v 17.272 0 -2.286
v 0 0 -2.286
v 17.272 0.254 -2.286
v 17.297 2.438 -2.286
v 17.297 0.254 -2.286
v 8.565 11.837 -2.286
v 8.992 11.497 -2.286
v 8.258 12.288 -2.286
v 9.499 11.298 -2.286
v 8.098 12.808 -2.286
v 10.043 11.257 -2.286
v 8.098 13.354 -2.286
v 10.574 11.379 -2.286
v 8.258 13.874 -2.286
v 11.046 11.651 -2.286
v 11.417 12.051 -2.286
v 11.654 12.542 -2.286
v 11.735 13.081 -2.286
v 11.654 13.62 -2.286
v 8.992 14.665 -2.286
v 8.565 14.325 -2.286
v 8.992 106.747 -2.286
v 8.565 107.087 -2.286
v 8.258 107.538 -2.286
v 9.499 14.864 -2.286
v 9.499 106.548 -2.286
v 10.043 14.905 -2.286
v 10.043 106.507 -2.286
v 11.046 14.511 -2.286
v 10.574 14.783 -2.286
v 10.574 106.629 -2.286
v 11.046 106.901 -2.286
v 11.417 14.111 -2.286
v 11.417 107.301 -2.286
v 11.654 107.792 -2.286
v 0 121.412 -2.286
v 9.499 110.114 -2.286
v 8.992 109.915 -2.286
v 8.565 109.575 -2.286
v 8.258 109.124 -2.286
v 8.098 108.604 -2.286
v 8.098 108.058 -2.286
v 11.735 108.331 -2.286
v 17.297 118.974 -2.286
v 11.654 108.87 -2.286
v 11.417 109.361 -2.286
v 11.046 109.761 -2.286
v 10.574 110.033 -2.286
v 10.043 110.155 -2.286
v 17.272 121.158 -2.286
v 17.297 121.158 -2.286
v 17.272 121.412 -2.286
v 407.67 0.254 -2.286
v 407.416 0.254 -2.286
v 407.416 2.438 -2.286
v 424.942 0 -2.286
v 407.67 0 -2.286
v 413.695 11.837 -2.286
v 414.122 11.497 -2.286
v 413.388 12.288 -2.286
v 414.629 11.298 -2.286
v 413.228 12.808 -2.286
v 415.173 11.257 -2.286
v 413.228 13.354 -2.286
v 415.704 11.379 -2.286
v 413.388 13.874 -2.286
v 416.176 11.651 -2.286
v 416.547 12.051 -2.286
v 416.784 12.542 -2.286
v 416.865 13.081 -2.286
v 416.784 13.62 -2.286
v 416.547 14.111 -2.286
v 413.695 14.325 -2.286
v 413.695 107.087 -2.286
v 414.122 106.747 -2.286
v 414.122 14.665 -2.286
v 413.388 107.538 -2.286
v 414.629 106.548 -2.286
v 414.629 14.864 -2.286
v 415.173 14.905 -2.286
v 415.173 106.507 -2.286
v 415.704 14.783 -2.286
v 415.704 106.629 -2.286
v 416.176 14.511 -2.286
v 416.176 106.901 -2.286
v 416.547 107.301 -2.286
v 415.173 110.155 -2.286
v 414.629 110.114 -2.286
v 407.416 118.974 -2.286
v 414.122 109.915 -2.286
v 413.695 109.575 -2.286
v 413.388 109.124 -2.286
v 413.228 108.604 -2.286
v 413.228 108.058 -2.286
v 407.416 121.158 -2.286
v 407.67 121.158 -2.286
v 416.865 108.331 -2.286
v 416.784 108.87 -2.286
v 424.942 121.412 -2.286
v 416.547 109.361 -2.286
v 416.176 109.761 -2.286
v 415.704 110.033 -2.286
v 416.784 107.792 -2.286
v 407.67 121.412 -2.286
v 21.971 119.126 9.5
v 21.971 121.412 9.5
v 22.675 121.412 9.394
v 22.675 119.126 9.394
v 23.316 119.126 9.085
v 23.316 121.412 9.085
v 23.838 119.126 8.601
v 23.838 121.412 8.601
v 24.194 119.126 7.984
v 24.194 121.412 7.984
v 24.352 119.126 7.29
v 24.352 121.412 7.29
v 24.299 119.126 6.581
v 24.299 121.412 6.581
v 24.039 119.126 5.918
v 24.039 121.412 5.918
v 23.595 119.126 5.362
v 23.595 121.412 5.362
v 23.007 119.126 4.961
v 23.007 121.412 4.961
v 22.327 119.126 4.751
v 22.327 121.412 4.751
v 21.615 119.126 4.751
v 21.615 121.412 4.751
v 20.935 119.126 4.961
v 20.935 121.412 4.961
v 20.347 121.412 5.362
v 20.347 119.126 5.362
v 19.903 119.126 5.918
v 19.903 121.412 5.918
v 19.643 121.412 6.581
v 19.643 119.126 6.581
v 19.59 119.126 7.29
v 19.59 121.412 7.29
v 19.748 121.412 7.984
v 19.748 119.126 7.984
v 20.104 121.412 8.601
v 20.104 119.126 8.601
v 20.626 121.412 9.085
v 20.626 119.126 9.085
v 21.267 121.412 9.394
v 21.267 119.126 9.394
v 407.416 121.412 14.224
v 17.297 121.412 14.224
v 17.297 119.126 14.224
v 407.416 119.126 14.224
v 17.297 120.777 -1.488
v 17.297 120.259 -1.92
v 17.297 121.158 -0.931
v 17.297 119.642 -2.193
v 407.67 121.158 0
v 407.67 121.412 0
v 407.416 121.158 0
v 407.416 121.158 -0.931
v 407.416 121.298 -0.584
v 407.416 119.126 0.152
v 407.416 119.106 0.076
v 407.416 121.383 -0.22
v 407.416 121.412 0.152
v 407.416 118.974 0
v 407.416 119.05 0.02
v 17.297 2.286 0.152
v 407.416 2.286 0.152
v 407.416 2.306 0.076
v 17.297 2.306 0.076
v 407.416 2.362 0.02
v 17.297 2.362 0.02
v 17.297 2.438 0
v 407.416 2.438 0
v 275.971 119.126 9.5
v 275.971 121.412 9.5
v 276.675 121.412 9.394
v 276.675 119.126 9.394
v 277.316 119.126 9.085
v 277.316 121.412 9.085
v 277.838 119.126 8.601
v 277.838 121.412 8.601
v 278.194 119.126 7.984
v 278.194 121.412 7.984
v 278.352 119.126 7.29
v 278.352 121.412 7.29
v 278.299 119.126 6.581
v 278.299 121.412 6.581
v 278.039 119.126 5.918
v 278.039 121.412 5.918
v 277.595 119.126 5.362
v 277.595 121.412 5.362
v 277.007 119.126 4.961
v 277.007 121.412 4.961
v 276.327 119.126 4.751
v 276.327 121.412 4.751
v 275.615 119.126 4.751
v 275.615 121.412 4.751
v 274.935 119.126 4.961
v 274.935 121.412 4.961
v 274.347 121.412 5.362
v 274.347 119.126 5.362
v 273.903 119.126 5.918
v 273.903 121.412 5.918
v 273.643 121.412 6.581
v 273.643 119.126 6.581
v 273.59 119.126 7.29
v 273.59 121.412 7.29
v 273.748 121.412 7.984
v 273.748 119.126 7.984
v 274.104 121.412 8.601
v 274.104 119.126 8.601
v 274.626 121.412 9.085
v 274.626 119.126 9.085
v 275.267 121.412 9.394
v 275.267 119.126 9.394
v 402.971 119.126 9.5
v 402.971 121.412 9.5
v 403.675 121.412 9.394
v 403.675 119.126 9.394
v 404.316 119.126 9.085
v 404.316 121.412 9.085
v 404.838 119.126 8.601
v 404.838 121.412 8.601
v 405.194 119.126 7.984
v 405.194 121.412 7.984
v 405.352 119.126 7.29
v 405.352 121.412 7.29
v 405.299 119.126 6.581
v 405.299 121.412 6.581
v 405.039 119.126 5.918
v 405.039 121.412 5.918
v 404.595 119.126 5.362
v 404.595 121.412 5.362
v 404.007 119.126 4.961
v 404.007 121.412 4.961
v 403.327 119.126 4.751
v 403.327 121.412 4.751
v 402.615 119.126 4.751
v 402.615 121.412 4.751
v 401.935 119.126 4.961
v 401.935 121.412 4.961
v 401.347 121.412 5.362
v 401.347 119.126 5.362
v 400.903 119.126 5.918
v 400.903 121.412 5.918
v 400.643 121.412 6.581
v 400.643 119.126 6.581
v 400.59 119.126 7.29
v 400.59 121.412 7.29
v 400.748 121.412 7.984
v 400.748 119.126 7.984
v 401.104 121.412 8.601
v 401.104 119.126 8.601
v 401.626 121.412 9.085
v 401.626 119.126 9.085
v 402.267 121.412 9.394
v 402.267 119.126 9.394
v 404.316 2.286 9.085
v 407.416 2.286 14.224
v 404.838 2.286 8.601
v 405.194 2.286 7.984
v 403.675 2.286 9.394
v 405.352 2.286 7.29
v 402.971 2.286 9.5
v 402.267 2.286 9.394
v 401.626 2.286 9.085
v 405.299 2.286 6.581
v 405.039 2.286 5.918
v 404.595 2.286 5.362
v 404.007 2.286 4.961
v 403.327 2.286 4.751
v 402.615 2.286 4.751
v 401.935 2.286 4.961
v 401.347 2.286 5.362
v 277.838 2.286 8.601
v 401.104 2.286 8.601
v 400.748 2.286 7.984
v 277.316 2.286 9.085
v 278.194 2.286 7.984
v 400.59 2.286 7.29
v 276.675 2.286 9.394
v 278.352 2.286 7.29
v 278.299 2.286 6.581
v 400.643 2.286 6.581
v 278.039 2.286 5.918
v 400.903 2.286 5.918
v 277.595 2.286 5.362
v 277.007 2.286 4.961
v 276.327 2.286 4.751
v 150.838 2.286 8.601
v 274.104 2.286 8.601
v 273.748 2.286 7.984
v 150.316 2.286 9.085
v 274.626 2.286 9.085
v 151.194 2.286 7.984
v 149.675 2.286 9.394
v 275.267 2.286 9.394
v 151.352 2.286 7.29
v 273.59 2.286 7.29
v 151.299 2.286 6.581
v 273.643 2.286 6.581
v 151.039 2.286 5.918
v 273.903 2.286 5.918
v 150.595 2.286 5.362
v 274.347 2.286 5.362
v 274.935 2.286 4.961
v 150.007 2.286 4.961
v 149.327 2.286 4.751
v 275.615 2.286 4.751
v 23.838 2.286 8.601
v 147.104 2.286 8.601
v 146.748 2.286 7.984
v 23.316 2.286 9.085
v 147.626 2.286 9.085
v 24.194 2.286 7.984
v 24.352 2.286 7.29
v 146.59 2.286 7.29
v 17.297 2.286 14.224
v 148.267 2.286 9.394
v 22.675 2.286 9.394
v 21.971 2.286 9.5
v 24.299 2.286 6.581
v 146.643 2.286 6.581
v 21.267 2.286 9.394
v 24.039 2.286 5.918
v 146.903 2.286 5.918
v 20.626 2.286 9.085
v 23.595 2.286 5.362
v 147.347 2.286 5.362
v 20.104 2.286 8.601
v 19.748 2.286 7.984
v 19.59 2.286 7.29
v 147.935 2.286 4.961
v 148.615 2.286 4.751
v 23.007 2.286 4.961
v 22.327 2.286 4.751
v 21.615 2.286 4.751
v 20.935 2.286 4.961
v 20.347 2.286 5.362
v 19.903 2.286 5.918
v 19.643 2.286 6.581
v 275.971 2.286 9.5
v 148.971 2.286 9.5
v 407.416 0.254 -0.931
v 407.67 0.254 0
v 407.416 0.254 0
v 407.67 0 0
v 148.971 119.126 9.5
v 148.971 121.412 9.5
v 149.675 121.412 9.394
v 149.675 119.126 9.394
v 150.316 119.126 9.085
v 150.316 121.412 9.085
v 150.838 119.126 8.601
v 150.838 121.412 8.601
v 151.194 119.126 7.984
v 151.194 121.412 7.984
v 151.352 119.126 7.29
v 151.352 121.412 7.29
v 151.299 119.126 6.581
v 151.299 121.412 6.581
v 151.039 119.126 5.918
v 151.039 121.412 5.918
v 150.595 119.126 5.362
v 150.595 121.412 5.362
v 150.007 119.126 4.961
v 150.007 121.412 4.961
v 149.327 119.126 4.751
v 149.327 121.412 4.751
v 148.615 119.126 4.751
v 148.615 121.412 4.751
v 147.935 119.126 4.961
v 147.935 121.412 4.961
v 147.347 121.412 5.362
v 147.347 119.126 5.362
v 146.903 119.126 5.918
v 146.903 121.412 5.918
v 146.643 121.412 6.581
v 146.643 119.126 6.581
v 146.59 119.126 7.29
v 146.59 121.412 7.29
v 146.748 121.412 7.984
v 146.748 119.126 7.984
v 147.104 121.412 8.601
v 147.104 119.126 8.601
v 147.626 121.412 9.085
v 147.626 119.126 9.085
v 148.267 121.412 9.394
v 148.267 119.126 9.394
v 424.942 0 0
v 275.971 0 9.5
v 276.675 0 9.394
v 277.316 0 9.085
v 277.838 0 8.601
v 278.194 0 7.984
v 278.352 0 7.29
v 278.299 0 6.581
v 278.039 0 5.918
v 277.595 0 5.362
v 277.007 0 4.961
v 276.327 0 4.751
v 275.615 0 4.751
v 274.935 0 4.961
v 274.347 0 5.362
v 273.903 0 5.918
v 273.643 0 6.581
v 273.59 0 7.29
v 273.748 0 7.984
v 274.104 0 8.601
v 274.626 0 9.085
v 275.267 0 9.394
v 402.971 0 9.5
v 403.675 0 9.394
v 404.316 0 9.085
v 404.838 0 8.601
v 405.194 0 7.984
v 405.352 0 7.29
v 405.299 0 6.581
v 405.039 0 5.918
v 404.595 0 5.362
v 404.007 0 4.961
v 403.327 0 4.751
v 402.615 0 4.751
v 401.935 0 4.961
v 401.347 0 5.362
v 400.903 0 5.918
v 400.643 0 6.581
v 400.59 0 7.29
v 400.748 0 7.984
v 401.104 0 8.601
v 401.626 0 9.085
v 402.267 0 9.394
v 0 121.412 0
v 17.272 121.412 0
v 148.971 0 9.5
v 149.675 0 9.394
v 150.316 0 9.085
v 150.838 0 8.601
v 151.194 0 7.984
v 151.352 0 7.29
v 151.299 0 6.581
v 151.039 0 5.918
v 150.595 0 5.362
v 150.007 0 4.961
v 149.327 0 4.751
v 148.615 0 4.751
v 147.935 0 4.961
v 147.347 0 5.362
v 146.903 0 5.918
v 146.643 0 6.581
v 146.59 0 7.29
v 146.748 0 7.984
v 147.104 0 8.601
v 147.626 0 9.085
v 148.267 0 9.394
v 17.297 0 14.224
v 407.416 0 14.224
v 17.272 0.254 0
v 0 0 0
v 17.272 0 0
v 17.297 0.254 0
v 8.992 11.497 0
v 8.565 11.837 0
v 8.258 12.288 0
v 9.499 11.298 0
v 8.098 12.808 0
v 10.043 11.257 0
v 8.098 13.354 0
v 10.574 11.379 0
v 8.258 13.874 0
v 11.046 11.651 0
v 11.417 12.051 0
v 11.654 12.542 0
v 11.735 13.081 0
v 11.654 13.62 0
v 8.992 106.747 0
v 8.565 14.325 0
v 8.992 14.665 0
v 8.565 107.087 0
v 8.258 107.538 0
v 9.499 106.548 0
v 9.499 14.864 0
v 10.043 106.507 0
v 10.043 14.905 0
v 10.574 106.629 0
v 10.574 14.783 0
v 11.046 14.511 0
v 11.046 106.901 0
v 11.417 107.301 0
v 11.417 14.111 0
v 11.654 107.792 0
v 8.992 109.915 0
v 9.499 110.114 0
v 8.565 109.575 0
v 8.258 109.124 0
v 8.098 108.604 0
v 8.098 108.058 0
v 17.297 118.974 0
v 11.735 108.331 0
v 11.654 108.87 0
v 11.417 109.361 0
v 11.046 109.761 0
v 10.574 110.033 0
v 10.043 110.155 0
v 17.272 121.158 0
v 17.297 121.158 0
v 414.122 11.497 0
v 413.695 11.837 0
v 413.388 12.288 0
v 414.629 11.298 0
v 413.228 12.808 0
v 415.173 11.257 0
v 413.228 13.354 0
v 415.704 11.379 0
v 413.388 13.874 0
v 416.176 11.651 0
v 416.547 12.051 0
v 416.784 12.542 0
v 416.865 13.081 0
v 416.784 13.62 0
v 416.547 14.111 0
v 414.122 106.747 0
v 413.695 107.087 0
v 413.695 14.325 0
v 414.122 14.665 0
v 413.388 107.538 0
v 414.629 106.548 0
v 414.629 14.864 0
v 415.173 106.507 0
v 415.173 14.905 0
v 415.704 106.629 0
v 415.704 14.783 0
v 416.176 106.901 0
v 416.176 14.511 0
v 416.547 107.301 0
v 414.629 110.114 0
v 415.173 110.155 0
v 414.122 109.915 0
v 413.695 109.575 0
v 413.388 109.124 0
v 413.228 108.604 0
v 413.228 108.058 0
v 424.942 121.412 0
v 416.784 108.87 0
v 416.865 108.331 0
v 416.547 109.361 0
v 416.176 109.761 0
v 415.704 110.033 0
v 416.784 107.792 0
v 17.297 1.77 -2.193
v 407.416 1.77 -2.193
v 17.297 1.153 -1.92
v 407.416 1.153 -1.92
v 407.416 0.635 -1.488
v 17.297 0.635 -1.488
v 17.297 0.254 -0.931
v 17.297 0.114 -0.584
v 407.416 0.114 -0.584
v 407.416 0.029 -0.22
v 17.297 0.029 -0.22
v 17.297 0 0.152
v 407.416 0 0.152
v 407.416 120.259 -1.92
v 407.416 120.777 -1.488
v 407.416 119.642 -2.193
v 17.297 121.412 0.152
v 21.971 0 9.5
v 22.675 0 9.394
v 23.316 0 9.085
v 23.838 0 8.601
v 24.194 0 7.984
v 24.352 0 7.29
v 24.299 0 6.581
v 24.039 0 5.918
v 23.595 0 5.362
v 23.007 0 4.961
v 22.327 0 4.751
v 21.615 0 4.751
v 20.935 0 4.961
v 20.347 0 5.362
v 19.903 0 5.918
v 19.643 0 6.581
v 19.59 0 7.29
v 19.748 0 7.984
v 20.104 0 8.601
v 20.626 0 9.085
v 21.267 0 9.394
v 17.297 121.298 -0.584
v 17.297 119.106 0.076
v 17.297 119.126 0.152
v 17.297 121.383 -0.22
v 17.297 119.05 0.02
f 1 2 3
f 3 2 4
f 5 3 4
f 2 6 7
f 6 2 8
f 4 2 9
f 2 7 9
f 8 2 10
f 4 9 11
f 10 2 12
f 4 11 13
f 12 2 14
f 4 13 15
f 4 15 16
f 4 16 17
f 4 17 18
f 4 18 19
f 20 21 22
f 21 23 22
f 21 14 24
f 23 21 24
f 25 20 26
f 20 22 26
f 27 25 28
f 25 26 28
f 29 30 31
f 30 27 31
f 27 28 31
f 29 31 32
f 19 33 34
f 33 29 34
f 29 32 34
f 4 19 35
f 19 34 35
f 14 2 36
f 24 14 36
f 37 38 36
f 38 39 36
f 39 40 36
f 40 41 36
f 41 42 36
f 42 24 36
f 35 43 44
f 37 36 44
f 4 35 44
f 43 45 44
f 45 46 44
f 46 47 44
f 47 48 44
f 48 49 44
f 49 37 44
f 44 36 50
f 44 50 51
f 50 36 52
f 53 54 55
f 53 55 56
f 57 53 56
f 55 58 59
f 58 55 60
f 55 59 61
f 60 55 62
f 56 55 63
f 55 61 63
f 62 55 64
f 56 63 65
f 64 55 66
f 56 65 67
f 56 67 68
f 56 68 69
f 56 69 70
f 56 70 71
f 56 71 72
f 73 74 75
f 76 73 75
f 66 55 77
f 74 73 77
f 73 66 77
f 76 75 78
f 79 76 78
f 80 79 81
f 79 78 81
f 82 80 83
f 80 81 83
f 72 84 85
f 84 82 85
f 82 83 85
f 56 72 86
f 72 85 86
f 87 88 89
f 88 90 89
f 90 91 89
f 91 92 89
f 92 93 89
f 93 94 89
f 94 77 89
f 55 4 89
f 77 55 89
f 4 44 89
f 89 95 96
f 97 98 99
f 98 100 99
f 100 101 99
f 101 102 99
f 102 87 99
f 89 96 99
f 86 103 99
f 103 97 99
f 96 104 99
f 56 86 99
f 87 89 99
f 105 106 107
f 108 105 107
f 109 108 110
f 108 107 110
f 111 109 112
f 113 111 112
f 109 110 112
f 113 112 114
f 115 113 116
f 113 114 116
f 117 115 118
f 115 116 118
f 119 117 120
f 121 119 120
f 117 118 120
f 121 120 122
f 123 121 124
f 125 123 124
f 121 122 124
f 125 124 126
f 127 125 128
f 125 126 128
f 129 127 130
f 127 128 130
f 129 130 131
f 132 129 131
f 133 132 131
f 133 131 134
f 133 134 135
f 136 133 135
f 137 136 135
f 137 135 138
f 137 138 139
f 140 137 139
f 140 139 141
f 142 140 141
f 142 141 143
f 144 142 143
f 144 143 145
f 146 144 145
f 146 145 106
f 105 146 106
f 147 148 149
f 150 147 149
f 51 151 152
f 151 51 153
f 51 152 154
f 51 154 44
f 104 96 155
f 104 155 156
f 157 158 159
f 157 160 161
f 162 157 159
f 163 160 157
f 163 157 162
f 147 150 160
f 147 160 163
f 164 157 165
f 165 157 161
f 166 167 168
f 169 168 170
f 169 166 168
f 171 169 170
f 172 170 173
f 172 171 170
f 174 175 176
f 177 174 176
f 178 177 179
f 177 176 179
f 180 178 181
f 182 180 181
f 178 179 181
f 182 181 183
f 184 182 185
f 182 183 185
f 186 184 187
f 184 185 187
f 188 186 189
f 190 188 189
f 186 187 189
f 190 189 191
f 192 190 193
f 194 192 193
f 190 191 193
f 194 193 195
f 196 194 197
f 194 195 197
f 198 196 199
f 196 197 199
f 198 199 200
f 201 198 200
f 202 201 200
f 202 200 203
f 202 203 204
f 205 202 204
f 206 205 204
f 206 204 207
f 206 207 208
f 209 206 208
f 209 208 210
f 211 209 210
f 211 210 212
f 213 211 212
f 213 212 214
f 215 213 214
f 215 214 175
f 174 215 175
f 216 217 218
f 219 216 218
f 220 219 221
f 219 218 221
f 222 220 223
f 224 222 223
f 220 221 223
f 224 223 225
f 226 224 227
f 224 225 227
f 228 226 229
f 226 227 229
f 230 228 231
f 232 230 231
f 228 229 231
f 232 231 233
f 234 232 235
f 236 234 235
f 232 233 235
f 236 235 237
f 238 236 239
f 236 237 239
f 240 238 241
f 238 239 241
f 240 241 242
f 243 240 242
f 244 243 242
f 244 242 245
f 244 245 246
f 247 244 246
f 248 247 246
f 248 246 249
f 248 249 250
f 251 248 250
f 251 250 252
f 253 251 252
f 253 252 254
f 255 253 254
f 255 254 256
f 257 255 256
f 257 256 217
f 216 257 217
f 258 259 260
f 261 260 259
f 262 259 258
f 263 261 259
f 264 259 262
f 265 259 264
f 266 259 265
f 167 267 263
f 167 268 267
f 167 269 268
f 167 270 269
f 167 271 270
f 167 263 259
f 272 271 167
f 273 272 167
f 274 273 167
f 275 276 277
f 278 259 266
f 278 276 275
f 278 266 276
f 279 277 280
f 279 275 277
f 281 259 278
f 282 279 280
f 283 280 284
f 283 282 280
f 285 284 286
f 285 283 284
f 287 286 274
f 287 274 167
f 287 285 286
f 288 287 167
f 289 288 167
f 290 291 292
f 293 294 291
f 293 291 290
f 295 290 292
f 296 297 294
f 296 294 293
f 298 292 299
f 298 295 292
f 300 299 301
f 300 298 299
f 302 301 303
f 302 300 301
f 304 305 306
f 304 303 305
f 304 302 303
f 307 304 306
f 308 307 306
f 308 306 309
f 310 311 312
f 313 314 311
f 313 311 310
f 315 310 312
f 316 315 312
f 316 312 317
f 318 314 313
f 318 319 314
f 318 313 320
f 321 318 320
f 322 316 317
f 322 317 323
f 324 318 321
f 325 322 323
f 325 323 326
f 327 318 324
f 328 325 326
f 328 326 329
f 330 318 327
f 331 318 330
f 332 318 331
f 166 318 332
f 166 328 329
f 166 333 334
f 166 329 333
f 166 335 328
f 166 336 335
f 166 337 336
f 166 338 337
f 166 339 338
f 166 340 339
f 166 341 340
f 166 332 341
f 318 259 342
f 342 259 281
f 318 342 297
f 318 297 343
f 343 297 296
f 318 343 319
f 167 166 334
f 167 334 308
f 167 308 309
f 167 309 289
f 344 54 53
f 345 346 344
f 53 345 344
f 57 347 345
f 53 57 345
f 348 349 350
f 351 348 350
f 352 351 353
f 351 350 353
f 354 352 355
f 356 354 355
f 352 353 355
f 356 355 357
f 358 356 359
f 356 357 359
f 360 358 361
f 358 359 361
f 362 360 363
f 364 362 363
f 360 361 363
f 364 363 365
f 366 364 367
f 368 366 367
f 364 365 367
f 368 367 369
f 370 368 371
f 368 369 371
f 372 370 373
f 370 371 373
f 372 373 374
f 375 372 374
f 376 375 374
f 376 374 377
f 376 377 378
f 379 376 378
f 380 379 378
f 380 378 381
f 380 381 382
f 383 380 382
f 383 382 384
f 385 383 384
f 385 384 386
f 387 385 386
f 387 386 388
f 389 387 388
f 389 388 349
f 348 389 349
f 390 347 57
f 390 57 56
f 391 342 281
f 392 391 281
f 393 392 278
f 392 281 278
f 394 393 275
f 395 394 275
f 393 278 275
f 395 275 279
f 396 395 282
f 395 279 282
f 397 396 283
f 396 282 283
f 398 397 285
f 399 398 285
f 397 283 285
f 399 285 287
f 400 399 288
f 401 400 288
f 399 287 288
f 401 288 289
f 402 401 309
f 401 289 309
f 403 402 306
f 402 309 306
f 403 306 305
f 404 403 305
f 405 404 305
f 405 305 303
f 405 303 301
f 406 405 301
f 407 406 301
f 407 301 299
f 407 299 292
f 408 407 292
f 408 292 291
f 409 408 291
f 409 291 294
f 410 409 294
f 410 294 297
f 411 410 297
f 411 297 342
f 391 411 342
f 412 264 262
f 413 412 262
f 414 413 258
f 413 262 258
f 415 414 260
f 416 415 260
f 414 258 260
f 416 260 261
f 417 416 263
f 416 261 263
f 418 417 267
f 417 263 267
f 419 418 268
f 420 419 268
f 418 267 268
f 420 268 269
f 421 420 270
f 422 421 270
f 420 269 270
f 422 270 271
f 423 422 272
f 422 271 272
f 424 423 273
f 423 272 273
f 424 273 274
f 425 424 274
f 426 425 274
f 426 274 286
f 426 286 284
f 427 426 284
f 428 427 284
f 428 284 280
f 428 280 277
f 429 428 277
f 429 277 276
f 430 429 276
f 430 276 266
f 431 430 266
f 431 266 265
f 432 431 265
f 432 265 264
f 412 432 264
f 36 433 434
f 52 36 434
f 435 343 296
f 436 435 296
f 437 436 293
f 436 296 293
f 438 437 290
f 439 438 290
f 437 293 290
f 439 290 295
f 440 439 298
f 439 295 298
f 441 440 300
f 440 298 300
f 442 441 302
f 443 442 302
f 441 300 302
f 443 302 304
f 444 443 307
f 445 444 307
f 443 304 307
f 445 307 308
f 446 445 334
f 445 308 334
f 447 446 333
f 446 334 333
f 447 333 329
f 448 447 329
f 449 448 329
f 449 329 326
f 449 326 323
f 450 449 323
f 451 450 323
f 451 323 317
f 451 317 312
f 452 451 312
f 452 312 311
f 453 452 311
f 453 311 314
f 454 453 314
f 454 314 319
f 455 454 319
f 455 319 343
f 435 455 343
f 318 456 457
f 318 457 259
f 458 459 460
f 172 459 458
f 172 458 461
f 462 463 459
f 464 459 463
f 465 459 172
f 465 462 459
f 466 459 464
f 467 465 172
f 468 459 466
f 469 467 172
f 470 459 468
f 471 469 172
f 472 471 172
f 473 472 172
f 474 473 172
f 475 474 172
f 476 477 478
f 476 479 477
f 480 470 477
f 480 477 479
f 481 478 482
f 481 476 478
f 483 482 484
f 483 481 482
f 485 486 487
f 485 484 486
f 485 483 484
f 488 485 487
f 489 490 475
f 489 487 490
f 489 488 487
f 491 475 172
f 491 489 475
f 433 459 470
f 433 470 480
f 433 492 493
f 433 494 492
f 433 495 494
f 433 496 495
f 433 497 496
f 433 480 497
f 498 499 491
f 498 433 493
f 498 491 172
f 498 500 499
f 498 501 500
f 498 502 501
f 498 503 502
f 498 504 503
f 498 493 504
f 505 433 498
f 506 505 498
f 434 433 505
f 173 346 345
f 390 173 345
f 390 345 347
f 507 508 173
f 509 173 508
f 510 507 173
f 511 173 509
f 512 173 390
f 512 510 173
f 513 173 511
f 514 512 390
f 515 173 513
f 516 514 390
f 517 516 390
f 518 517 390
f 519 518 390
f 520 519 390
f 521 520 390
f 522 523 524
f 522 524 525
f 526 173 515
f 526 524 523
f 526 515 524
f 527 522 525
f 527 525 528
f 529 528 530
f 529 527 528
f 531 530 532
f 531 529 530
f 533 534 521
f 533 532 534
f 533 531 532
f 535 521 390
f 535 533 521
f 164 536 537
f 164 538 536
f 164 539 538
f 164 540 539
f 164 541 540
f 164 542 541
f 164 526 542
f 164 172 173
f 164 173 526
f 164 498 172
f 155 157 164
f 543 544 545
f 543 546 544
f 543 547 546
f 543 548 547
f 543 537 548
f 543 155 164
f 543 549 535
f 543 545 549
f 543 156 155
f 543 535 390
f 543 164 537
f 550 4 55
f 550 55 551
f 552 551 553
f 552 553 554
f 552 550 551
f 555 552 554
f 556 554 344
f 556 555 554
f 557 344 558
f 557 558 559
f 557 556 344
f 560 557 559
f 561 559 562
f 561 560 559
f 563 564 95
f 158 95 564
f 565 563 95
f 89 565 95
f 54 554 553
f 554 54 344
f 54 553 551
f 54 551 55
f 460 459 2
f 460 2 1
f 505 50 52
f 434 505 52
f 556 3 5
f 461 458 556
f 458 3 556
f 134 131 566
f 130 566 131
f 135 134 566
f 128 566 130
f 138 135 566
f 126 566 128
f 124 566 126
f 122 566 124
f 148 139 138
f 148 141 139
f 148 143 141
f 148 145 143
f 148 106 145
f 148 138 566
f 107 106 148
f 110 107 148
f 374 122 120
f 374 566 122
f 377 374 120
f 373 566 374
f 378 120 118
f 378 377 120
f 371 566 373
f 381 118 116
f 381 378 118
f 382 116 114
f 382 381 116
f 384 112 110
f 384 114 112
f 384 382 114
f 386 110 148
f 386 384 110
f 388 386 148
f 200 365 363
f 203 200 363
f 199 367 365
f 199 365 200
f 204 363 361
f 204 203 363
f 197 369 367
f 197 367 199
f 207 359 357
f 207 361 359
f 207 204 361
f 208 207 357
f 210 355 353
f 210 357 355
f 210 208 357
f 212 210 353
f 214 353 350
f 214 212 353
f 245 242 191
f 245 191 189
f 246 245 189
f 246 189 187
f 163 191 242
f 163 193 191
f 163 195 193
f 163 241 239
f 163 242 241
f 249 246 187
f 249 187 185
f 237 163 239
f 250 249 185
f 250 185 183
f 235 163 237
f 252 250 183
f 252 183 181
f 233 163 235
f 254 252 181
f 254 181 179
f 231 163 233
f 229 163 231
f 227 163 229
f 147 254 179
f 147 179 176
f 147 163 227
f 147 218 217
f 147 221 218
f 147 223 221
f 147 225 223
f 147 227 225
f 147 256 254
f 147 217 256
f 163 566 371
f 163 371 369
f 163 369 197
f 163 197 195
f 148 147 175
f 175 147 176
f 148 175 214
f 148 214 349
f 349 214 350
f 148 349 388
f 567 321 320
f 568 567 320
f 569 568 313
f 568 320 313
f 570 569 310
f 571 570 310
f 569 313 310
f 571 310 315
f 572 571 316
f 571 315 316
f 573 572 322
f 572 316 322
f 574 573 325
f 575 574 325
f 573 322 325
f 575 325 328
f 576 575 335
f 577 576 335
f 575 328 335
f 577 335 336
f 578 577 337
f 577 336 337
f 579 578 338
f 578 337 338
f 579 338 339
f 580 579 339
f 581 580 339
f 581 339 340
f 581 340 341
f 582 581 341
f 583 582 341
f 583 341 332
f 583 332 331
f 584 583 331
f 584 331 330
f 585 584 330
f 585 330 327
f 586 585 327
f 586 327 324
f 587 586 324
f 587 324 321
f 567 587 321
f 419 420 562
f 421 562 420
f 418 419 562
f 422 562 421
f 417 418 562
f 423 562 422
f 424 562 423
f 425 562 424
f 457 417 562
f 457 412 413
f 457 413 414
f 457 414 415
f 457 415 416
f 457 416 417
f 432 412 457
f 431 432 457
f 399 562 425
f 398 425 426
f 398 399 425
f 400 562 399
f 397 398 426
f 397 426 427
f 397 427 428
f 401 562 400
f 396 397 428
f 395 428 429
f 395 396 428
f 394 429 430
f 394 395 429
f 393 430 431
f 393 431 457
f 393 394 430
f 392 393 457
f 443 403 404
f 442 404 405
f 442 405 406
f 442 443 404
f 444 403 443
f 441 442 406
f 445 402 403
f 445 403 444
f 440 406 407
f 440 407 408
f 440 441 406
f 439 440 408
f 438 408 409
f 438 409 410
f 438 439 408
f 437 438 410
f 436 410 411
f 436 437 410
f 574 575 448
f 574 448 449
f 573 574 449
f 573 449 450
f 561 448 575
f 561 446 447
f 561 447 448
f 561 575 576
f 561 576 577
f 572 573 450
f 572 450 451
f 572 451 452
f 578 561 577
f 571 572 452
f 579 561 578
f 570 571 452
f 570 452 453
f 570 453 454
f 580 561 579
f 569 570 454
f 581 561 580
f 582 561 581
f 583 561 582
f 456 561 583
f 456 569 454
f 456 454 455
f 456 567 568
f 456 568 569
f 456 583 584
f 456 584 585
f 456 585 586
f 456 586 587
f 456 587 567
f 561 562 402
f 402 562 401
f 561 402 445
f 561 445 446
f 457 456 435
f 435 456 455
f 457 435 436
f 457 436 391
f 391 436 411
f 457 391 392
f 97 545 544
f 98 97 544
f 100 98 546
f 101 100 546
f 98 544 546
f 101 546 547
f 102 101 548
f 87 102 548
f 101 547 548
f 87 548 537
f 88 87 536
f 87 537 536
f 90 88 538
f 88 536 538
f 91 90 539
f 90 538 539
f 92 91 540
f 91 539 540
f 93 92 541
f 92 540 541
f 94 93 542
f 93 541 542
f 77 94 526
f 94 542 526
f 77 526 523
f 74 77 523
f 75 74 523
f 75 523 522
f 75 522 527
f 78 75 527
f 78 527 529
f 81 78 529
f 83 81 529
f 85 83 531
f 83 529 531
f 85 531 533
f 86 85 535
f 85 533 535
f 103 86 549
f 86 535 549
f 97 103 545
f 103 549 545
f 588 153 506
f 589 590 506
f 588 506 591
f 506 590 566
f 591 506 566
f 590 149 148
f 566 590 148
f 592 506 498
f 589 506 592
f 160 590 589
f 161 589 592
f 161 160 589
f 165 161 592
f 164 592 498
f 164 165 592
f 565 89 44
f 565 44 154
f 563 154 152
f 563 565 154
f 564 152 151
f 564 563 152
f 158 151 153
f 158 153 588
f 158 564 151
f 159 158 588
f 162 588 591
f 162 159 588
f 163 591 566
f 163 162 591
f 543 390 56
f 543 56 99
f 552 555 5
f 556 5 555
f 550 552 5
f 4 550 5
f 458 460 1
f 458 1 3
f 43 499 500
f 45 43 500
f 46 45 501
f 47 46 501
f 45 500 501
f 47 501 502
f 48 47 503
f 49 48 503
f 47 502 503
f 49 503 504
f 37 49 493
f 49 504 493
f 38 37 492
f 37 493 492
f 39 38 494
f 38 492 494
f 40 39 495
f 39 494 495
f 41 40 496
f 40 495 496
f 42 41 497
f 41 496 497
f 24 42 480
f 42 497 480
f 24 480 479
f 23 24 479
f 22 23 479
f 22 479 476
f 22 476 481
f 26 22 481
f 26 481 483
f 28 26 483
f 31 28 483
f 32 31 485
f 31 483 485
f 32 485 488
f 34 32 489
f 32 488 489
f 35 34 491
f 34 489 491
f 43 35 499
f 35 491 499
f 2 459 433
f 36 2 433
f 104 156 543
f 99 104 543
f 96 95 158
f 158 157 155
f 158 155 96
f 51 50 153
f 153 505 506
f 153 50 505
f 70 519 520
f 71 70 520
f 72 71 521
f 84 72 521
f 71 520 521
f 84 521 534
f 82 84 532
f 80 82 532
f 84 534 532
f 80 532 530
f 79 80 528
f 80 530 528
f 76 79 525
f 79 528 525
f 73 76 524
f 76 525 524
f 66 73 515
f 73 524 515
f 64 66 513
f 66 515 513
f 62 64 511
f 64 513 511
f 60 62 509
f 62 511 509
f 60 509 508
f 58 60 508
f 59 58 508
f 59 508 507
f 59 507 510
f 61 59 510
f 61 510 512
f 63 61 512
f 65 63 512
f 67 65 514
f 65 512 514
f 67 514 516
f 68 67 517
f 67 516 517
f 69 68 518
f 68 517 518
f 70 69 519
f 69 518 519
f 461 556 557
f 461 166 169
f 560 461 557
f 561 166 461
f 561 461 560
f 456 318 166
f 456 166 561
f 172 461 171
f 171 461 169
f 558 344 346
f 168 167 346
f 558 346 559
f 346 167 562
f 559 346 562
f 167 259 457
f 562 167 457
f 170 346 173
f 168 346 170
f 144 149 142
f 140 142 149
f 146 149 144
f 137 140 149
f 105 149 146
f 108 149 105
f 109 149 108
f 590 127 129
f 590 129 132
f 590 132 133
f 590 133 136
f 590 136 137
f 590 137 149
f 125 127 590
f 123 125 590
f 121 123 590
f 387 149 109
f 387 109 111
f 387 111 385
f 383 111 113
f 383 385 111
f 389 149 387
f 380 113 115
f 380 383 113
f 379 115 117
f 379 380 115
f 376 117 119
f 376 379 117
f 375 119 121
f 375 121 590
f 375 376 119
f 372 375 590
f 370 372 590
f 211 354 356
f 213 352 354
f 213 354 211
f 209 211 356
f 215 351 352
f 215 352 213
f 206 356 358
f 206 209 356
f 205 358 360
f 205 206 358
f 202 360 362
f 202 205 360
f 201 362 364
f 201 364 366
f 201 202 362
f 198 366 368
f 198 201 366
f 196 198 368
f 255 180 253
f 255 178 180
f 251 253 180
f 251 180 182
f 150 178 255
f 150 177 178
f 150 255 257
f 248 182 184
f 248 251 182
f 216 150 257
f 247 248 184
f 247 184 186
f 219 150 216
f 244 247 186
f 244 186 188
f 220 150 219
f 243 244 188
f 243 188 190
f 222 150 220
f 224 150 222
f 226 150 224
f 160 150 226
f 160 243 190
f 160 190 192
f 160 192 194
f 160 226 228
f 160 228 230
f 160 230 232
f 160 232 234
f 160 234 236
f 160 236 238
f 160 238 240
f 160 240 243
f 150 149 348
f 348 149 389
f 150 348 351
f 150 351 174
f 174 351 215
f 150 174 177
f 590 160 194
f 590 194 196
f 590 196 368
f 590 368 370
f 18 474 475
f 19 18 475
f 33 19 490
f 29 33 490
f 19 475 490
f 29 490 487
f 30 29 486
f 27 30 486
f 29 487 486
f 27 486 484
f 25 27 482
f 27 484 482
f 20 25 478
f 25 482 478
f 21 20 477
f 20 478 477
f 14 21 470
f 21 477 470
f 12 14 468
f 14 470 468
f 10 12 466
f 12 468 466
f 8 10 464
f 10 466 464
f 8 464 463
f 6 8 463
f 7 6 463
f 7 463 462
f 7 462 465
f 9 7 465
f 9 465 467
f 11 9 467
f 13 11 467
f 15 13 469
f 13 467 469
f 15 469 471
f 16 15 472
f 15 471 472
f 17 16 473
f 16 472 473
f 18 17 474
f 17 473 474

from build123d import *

# Parameters (mm, degrees)
SKETCH1_W                      = 424.942
SKETCH1_H                      = 121.412
SKETCH1_R                      = 1.8288
BASE_FLANGE1_DEPTH             = 2.286
SKETCH4_W                      = 0.0254
SKETCH4_H                      = 0.254
SKETCH4_W_2                    = 0.254
CUT_EXTRUDE1_DEPTH             = 2.286
EDGE_FLANGE1_STRIP_W           = 9.4488
EDGE_FLANGE1_STRIP_H           = 2.286
EDGE_FLANGE1_STRIP_CUT_DEPTH   = 390.1186
EDGE_FLANGE1_STRIP_2_W         = 9.4488
EDGE_FLANGE1_STRIP_2_H         = 2.286
EDGE_FLANGE1_STRIP_CUT_2_DEPTH = 390.1186
EDGE_FLANGE1_DEPTH             = 390.1186
EDGE_FLANGE1_BEND_DEPTH        = 390.1186
SKETCH10_R                     = 2.3876
CUT_EXTRUDE2_DEPTH             = 443.175190715


# Sheet-metal steps are written as plain solids
with BuildPart() as part:
    # Sketch1 → Base-Flange1 (new body)
    with BuildSketch(Plane.XY):
        with Locations((212.471, 60.706)):
            Rectangle(SKETCH1_W, SKETCH1_H)
        with Locations((9.906, 13.081)):
            Circle(SKETCH1_R, mode=Mode.SUBTRACT)
        with Locations((415.036, 13.081)):
            Circle(SKETCH1_R, mode=Mode.SUBTRACT)
        with Locations((9.906, 108.331)):
            Circle(SKETCH1_R, mode=Mode.SUBTRACT)
        with Locations((415.036, 108.331)):
            Circle(SKETCH1_R, mode=Mode.SUBTRACT)
    extrude(amount=-BASE_FLANGE1_DEPTH)

    # Sketch4 → Cut-Extrude1 (cut)
    with BuildSketch(Plane.XY):
        with Locations((17.2847, 121.285)):
            Rectangle(SKETCH4_W, SKETCH4_H)
        with Locations((407.543, 121.285)):
            Rectangle(SKETCH4_W_2, SKETCH4_H)
        with Locations((407.543, 0.127)):
            Rectangle(SKETCH4_W_2, SKETCH4_H)
        with Locations((17.2847, 0.127)):
            Rectangle(SKETCH4_W, SKETCH4_H)
    extrude(amount=-CUT_EXTRUDE1_DEPTH, mode=Mode.SUBTRACT)

    # Edge-Flange1 strip (across the edge) → Edge-Flange1 strip cut (cut)
    with BuildSketch(Plane(origin=(407.416, 121.412, 0), x_dir=(0, -1, 0), z_dir=(-1, 0, 0))):
        with Locations((-2.286, -1.143)):
            Rectangle(EDGE_FLANGE1_STRIP_W, EDGE_FLANGE1_STRIP_H)
    extrude(amount=EDGE_FLANGE1_STRIP_CUT_DEPTH, mode=Mode.SUBTRACT)

    # Edge-Flange1 strip 2 (across the edge) → Edge-Flange1 strip cut 2 (cut)
    with BuildSketch(Plane.YZ.offset(17.2974)):
        with Locations((-2.286, -1.143)):
            Rectangle(EDGE_FLANGE1_STRIP_2_W, EDGE_FLANGE1_STRIP_2_H)
    extrude(amount=EDGE_FLANGE1_STRIP_CUT_2_DEPTH, mode=Mode.SUBTRACT)

    # Edge-Flange1 section (across the edge) → Edge-Flange1 (add)
    with BuildSketch(Plane(origin=(407.416, 121.412, 0), x_dir=(0, -1, 0), z_dir=(-1, 0, 0))):
        with BuildLine():
            Line((0, 0.1524), (0, 14.224))
            Line((0, 14.224), (2.286, 14.224))
            Line((2.286, 14.224), (2.286, 0.1524))
            ThreePointArc((2.286, 0.1524), (2.330636927, 0.044636927), (2.4384, 0))
            Line((2.4384, 0), (2.4384, -2.286))
            ThreePointArc((2.4384, -2.286), (0.714190825, -1.571809175), (0, 0.1524))
        make_face()
    extrude(amount=EDGE_FLANGE1_DEPTH)

    # Edge-Flange1 section 2 (across the edge) → Edge-Flange1 bend (add)
    with BuildSketch(Plane.YZ.offset(17.2974)):
        with BuildLine():
            Line((0, 0.1524), (0, 14.224))
            Line((0, 14.224), (2.286, 14.224))
            Line((2.286, 14.224), (2.286, 0.1524))
            ThreePointArc((2.286, 0.1524), (2.330636927, 0.044636927), (2.4384, 0))
            Line((2.4384, 0), (2.4384, -2.286))
            ThreePointArc((2.4384, -2.286), (0.714190825, -1.571809175), (0, 0.1524))
        make_face()
    extrude(amount=EDGE_FLANGE1_BEND_DEPTH)

    # Sketch10 → Cut-Extrude2 (cut, through all)
    with BuildSketch(Plane(origin=(0, 121.412, 0), x_dir=(-1, 0, 0), z_dir=(0, 1, 0))):
        with Locations(Location((-402.971, 7.112, 0), (0, 0, 90))):
            Circle(SKETCH10_R)
        with Locations(Location((-275.971, 7.112, 0), (0, 0, 90))):
            Circle(SKETCH10_R)
        with Locations(Location((-148.971, 7.112, 0), (0, 0, 90))):
            Circle(SKETCH10_R)
        with Locations(Location((-21.971, 7.112, 0), (0, 0, 90))):
            Circle(SKETCH10_R)
    extrude(amount=-CUT_EXTRUDE2_DEPTH, mode=Mode.SUBTRACT)


solid = part.part
